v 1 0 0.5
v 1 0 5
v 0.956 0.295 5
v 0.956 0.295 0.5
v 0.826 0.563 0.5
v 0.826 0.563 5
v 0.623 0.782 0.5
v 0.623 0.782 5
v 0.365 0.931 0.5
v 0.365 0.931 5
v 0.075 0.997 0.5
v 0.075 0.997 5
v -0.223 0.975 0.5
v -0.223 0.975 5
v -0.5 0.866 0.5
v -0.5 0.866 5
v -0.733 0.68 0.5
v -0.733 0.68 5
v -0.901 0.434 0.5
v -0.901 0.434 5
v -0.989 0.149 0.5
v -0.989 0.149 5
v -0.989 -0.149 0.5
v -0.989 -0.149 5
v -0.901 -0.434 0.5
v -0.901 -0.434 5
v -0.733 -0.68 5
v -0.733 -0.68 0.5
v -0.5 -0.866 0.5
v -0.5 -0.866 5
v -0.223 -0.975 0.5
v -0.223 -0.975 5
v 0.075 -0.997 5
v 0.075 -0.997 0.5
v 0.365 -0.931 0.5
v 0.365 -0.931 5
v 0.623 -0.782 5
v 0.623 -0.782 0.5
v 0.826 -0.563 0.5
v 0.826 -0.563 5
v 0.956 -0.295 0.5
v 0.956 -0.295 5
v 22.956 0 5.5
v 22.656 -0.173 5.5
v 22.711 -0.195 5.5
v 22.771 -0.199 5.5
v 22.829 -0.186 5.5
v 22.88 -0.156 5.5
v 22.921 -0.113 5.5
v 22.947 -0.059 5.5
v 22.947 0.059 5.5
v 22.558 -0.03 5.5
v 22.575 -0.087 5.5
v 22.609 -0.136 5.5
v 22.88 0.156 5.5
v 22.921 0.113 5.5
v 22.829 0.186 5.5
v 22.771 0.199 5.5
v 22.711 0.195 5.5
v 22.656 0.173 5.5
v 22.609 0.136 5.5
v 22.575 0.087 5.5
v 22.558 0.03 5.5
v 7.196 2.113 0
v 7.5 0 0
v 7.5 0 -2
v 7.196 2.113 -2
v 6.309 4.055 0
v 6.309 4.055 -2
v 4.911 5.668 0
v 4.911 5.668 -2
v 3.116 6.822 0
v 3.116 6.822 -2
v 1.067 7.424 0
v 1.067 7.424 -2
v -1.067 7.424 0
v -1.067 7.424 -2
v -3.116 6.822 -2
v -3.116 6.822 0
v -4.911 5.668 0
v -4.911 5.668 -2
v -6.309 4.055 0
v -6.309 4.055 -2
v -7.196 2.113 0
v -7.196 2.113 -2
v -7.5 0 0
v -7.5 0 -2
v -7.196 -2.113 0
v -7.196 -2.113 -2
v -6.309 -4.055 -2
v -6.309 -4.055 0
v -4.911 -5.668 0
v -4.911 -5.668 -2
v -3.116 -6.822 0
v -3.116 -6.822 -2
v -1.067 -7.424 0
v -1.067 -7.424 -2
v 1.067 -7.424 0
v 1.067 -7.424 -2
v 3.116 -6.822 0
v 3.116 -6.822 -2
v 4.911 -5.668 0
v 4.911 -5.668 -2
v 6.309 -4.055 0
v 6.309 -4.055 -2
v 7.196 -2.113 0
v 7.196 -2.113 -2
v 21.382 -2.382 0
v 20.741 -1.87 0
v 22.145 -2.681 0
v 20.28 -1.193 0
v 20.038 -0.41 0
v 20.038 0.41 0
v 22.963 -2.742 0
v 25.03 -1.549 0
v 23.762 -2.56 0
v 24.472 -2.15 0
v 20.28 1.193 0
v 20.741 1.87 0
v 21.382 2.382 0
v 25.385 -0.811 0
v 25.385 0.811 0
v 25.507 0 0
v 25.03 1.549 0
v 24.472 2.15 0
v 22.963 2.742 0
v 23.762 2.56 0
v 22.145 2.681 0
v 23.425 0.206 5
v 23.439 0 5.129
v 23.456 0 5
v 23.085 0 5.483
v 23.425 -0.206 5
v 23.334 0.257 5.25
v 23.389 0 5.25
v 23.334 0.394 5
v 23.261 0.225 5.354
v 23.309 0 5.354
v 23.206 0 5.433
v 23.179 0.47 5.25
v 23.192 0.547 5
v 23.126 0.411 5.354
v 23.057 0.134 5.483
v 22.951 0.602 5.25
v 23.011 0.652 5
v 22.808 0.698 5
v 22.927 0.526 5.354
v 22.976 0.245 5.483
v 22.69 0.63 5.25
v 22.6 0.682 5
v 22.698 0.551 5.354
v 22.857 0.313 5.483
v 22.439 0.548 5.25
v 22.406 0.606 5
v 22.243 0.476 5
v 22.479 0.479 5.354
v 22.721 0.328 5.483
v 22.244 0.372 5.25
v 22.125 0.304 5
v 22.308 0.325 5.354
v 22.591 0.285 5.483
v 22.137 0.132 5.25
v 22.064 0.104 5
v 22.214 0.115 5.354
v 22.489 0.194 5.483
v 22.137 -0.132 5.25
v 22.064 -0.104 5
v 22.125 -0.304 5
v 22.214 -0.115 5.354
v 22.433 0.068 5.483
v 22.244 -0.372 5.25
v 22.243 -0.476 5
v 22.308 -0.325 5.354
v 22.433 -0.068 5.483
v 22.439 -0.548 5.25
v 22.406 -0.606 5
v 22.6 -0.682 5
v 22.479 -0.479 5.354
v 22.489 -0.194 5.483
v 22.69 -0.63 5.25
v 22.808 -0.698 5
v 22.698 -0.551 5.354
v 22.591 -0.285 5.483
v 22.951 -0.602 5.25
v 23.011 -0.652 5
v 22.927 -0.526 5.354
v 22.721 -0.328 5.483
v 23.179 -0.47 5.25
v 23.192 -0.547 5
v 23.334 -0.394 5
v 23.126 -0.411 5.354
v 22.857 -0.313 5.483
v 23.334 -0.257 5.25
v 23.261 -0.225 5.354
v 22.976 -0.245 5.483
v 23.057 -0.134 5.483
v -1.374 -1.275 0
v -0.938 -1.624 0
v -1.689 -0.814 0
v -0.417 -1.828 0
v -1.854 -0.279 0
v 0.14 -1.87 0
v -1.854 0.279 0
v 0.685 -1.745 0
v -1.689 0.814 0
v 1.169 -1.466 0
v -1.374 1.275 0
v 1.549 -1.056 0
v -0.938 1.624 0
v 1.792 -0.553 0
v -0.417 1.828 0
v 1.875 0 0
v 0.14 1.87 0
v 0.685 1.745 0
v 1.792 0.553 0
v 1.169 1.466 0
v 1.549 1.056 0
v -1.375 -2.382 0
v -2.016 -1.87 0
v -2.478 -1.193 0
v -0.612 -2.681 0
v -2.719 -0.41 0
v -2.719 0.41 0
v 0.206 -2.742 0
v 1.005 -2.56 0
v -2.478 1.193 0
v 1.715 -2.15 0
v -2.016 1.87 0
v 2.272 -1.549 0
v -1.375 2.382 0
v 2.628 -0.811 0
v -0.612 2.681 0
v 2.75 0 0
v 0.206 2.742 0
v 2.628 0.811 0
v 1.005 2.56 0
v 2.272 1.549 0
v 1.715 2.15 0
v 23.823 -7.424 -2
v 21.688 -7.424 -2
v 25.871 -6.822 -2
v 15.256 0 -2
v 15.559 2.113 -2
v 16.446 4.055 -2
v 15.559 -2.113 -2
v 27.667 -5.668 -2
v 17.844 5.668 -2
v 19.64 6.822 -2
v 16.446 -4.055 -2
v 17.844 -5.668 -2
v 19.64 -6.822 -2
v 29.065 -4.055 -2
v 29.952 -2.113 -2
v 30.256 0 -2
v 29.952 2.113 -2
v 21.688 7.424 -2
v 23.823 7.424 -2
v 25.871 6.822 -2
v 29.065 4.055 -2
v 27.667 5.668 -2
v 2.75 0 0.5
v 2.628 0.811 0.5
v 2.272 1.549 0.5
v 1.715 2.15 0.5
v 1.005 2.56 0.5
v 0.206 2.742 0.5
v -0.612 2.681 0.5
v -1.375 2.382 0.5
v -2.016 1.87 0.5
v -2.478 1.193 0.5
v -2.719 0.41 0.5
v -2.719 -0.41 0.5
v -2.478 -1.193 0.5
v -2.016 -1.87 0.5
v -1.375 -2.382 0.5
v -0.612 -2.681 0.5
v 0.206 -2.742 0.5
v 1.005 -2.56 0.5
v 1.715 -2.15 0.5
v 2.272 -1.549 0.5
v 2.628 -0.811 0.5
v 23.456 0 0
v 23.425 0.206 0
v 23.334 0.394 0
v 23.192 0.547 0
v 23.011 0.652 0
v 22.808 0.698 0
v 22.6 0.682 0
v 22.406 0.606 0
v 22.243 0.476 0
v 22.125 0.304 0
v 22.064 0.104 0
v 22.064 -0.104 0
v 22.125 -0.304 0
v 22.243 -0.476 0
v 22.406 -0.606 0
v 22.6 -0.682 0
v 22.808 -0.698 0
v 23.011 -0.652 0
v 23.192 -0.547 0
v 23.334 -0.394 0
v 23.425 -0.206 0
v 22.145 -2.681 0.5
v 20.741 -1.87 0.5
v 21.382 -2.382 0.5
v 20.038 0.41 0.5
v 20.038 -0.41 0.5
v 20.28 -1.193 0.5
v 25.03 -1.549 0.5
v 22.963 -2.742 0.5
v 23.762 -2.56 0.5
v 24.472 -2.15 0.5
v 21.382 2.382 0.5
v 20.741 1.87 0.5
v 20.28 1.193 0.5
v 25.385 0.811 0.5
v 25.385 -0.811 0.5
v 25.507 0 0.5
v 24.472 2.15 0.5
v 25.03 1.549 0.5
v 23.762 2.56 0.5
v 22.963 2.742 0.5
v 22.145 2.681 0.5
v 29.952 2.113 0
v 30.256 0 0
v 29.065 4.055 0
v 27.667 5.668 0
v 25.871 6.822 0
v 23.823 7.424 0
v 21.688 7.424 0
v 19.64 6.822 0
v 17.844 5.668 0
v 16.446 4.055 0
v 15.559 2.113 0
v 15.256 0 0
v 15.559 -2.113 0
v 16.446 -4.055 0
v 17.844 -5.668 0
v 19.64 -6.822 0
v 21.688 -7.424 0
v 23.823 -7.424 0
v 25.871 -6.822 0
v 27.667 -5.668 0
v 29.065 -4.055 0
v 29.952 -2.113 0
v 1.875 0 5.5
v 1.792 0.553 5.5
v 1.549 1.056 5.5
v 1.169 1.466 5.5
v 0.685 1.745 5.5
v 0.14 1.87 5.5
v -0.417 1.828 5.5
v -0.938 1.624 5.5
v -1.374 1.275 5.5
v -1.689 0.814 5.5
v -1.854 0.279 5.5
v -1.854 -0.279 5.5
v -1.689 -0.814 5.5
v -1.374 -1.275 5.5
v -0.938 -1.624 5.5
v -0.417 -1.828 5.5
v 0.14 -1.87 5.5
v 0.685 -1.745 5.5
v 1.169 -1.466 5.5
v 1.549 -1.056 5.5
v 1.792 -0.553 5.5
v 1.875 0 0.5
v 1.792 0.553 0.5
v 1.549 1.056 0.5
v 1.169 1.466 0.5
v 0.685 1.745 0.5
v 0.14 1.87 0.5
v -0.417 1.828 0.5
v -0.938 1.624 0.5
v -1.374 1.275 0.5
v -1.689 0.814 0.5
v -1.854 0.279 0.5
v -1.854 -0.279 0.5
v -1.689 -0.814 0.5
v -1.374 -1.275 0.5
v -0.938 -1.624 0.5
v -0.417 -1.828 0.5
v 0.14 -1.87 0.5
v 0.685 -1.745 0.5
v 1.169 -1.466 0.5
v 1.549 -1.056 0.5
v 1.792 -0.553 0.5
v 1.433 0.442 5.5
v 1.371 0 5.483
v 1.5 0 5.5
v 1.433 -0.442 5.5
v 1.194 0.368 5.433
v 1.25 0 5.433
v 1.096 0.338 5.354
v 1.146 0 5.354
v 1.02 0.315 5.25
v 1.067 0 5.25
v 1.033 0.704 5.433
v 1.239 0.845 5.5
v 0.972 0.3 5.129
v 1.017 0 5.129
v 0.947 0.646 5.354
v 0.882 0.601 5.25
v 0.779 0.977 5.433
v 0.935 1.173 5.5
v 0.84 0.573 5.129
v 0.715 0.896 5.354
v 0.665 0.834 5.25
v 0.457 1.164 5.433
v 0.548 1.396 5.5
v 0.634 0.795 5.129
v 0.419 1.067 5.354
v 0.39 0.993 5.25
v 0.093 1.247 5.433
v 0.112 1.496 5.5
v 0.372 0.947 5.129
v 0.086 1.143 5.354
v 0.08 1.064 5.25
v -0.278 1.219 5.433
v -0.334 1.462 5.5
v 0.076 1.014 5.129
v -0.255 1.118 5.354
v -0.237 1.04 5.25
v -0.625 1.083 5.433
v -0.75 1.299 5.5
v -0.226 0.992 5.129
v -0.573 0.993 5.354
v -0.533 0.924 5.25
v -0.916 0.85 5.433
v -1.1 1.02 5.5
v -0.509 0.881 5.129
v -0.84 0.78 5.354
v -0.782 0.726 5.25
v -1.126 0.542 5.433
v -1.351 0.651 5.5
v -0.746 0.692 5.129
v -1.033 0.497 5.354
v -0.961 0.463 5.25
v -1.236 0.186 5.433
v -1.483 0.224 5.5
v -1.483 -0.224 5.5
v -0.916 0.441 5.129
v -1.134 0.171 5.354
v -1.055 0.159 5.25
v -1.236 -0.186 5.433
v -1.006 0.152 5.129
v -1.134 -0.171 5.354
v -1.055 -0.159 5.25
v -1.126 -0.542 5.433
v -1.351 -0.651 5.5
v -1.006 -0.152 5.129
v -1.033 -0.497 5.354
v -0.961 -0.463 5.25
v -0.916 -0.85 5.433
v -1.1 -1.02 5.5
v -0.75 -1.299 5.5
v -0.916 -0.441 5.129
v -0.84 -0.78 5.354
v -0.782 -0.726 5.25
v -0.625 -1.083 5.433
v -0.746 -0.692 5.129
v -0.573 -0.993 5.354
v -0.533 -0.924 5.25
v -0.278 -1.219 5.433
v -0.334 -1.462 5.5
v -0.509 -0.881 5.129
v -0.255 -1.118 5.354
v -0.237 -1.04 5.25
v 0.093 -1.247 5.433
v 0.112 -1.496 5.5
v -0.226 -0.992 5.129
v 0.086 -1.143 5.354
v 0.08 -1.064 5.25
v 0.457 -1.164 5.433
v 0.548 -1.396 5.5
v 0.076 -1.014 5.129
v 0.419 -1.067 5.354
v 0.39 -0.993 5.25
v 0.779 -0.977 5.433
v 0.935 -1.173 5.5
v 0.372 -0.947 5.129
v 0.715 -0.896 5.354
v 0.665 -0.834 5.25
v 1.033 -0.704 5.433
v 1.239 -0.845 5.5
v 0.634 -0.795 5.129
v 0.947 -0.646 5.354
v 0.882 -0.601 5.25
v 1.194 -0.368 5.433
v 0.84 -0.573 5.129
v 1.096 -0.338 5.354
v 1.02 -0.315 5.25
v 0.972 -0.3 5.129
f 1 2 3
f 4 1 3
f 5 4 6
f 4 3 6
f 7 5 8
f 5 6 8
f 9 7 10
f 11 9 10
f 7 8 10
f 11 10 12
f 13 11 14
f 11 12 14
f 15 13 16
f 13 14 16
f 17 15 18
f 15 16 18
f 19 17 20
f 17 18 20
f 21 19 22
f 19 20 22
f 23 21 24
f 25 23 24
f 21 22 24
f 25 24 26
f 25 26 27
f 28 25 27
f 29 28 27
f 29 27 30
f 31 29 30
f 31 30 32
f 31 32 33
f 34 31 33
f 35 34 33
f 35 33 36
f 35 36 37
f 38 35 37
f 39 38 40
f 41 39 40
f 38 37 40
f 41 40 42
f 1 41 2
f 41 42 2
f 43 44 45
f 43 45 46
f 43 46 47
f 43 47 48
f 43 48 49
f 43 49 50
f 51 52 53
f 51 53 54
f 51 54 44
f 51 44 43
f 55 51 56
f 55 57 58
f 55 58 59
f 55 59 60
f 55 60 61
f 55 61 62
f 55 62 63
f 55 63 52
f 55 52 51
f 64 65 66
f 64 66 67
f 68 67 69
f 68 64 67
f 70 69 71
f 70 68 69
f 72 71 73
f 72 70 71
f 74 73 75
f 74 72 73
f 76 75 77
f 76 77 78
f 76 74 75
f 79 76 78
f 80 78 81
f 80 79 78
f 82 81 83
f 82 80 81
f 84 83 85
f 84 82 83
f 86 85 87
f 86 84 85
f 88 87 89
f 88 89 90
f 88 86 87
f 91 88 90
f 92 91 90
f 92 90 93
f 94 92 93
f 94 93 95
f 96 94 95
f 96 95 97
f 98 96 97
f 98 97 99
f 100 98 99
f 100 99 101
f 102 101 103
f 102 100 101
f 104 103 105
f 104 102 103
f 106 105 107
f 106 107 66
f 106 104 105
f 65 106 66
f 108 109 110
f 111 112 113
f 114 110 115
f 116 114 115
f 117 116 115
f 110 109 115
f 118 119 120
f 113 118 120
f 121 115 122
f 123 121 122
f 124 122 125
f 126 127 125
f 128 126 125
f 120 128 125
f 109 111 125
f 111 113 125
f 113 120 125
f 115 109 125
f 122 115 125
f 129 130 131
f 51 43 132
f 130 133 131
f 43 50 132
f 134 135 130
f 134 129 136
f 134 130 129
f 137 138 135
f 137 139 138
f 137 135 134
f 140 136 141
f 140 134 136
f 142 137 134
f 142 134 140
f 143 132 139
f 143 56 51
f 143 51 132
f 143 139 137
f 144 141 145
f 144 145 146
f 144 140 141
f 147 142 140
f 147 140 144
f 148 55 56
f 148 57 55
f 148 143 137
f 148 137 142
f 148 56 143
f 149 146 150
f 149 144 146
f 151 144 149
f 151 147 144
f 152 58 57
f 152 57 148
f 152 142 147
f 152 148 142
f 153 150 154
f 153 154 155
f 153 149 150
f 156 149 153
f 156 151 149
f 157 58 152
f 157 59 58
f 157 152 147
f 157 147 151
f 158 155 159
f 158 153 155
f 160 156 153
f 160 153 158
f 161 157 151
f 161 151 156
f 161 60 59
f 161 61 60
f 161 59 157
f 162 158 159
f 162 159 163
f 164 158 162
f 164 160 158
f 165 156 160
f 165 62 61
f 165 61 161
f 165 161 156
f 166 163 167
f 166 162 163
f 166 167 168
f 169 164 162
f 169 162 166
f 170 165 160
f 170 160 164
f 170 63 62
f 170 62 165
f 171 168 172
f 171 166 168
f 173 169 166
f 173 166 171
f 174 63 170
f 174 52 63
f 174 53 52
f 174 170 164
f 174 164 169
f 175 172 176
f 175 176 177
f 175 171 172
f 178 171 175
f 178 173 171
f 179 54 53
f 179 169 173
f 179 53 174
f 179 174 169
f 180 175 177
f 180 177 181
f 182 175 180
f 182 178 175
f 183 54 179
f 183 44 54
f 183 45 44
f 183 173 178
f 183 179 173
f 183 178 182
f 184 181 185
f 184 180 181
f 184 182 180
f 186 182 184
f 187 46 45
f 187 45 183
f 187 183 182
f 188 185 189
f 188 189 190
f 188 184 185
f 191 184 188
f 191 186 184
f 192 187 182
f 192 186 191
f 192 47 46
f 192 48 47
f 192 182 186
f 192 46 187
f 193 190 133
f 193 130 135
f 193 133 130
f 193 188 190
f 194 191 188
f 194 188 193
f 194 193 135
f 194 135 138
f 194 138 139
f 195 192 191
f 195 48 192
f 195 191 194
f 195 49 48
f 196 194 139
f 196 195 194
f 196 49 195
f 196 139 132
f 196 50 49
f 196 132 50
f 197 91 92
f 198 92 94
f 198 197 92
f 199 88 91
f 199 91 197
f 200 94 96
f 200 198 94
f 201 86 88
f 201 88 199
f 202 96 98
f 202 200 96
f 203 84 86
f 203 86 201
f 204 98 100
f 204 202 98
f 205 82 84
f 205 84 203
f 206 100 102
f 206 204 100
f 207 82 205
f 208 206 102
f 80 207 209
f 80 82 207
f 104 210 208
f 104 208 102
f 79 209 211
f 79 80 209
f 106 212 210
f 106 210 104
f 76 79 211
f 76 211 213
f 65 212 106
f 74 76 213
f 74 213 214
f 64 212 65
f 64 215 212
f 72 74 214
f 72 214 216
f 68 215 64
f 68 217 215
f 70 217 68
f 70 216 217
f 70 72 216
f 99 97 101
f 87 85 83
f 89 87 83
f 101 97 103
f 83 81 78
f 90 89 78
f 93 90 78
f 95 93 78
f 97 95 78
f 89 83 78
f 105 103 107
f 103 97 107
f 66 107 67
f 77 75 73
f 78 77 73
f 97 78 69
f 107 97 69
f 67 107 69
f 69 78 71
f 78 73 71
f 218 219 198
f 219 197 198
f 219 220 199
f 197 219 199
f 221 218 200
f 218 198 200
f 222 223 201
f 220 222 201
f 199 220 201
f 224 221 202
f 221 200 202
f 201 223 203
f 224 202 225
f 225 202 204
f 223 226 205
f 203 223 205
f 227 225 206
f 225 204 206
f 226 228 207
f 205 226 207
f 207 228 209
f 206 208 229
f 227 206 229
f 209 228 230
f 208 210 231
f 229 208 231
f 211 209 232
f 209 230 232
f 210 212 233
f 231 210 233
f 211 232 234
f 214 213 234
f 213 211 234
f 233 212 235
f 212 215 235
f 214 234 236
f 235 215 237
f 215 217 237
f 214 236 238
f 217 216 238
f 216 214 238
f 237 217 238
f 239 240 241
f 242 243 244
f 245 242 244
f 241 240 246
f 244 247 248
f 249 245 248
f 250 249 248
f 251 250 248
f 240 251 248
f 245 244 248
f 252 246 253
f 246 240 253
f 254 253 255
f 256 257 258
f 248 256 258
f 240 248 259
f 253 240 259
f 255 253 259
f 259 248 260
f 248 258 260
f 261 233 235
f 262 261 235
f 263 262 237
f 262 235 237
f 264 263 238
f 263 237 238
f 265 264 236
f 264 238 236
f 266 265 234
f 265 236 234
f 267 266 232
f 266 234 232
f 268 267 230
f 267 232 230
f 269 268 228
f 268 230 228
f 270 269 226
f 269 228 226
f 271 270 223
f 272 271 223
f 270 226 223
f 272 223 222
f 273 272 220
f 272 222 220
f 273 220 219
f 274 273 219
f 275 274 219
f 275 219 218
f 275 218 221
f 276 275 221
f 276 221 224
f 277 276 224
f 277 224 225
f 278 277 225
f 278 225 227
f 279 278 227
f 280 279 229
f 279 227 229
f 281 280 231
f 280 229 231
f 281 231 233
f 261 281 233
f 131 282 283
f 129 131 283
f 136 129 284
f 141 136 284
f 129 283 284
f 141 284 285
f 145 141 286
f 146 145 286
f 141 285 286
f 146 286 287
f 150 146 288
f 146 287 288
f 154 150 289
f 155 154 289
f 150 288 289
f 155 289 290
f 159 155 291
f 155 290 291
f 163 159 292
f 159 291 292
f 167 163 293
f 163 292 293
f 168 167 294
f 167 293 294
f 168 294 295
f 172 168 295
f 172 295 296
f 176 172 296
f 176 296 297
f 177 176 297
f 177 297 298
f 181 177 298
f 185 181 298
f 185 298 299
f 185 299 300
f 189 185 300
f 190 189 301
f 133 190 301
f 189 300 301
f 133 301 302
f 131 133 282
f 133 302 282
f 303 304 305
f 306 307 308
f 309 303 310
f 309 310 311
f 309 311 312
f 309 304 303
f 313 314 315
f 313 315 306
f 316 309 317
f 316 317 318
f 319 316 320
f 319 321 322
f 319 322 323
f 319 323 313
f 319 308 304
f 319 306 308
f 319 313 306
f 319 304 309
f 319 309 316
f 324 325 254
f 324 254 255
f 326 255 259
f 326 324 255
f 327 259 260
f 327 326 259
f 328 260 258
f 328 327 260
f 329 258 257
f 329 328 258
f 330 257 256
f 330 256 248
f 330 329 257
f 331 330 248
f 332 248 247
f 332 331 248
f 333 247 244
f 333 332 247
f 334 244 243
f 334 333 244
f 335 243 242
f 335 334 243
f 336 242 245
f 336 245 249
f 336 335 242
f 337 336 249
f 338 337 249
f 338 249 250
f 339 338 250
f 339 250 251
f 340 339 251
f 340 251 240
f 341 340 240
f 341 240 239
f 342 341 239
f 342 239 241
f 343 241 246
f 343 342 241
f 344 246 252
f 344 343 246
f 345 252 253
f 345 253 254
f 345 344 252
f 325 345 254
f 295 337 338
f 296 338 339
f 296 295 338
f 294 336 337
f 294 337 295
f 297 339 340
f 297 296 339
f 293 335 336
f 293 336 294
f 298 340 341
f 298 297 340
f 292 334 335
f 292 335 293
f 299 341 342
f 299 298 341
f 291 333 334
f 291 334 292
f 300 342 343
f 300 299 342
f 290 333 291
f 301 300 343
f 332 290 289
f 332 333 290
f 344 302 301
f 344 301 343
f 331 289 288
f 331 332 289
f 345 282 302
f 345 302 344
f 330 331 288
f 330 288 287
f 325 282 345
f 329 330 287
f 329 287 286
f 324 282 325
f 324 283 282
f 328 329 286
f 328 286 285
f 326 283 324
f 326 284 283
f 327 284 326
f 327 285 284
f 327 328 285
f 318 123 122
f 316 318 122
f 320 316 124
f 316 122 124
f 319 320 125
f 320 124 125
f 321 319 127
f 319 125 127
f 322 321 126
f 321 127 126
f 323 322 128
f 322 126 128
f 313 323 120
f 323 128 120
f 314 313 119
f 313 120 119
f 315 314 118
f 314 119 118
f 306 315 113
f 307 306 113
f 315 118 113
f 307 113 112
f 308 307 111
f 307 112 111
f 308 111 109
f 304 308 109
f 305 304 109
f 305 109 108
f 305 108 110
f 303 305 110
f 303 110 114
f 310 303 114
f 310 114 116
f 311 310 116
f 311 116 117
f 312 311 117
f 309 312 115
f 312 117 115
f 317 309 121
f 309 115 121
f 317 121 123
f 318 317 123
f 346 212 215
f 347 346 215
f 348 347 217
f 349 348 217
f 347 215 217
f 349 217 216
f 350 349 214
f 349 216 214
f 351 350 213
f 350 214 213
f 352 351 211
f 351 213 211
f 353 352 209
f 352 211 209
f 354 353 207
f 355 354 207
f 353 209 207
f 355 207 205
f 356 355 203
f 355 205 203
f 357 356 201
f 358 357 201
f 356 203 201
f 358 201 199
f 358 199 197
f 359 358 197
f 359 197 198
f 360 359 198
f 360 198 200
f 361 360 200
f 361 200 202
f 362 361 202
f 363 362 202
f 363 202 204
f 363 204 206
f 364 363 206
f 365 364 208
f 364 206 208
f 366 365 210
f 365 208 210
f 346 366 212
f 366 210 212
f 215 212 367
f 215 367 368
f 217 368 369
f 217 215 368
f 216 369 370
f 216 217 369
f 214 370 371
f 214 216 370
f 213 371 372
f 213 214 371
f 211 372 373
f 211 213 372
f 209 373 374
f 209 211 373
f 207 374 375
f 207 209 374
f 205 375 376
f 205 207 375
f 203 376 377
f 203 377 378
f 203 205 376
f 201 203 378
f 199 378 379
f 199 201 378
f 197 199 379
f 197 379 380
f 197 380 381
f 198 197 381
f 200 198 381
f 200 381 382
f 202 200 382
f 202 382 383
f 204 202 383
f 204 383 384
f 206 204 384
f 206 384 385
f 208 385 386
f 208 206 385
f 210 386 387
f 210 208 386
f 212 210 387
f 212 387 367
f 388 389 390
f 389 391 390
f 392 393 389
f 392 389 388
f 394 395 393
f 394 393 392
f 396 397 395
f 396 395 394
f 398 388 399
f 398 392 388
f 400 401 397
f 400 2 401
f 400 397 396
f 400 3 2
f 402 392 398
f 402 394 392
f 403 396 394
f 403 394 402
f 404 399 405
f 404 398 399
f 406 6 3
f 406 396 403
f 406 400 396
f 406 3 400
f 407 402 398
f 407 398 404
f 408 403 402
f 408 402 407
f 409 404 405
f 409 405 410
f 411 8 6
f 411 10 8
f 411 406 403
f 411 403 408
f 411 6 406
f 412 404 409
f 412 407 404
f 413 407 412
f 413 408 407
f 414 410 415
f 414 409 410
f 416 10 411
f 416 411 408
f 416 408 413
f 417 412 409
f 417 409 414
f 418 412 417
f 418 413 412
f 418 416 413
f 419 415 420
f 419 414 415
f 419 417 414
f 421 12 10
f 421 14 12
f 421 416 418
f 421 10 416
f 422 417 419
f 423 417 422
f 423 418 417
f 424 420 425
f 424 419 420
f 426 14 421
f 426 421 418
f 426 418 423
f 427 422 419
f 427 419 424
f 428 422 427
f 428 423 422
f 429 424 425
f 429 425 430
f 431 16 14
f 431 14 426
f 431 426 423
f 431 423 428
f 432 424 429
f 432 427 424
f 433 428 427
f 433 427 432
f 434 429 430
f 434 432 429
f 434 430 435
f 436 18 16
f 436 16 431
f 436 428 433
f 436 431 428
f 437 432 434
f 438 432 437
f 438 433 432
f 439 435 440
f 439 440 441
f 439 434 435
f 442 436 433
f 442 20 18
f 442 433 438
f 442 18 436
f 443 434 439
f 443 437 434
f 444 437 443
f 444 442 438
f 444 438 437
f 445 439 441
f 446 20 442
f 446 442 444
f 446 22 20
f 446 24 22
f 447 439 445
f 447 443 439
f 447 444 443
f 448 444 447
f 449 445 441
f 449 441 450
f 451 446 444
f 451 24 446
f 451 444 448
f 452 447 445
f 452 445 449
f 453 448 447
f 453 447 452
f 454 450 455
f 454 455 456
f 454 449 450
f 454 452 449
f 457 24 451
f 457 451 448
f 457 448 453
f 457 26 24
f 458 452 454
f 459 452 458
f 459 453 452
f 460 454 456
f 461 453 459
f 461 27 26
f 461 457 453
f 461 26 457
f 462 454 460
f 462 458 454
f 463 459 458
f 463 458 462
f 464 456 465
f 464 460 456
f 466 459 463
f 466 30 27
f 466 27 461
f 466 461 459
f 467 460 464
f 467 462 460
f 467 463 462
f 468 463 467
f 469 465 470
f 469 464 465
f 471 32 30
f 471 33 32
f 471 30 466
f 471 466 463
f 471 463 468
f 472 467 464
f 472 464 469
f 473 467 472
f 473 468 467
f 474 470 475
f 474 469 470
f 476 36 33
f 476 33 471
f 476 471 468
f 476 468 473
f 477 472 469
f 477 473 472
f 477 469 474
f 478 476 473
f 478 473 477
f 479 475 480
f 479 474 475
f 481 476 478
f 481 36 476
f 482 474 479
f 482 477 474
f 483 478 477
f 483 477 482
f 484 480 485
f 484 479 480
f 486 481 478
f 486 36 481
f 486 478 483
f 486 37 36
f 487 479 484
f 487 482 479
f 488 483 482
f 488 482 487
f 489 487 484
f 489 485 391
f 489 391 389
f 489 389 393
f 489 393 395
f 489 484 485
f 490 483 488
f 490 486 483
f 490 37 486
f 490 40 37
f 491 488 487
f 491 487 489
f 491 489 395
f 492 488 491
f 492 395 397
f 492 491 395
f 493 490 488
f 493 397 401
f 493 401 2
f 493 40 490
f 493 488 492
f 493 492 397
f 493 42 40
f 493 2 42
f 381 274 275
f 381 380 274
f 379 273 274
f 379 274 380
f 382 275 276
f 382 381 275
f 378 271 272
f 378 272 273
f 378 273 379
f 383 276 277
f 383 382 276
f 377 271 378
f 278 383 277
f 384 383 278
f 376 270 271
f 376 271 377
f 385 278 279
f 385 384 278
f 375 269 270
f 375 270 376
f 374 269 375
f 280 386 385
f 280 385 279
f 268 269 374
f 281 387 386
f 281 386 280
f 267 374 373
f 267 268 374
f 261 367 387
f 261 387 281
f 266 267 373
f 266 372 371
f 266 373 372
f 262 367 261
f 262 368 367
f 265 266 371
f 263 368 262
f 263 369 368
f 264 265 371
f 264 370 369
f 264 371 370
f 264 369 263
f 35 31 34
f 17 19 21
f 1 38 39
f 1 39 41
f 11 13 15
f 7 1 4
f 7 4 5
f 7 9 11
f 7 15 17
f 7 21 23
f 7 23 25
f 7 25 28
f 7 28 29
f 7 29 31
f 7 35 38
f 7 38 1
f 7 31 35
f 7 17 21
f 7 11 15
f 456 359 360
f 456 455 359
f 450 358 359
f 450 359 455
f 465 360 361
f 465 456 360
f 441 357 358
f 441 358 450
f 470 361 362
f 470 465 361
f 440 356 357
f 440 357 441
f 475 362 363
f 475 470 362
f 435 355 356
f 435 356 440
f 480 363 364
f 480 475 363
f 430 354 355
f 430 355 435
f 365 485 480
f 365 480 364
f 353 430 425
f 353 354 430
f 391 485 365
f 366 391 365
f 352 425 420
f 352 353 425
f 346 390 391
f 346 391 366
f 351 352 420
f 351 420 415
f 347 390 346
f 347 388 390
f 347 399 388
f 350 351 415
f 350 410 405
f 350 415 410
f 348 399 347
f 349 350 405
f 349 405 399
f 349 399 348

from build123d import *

# Parameters (mm, degrees)
F0_R      = 7.5
F1_DEPTH  = 2
F2_R      = 1.875
F3_DEPTH  = 5.5
F4_R      = 1
F5_DEPTH  = 5
F6_R      = 0.7
F7_DEPTH  = 5.5
F8_R      = 0.5
F8_2_R    = 0.5
F15_R     = 2.75
F15_R_2   = 1.875
F16_DEPTH = 0.5


with BuildPart() as f1:
    # F0 (on Top) → F1 (new body)
    with BuildSketch(Plane.XY):
        Circle(F0_R)
    extrude(amount=-F1_DEPTH)

    # F2 (on Top) → F3 (join)
    with BuildSketch(Plane.XY):
        Circle(F2_R)
    extrude(amount=F3_DEPTH)

    # F4 (on face) → F5 (cut)
    with BuildSketch(Plane.XY.offset(5.5)):
        Circle(F4_R)
    extrude(amount=-F5_DEPTH, mode=Mode.SUBTRACT)

    # F8#2
    f8_2_edges = [f1.edges().sort_by_distance(p)[0] for p in [
        (-1, 0, 5.5),
    ]]
    fillet(f8_2_edges, radius=F8_2_R)

    # F11 (on offset) → F12 (revolve, cut)
    with BuildSketch(Plane.XY.offset(-25)):
        with BuildLine():
            Line((0, 23), (0, -23))
            ThreePointArc((0, -23), (23, 0), (0, 23))
        make_face()
    revolve(axis=Axis((0, -3.1805001199, -25), (0, 1, 0)), mode=Mode.SUBTRACT)

    # F13 (on offset) → F14 (revolve, cut)
    with BuildSketch(Plane.XY.offset(-25)):
        with BuildLine():
            Line((22.7556936443, 23), (22.7556936443, -23))
            ThreePointArc((22.7556936443, -23), (45.7556936443, 0), (22.7556936443, 23))
        make_face()
    revolve(axis=Axis((22.7556936443, 0, -25), (0, 1, 0)), mode=Mode.SUBTRACT)


with BuildPart() as f1b:
    # F0 (on Top) → F1, piece 2 (new body)
    with BuildSketch(Plane.XY):
        with Locations((22.7556936443, 0)):
            Circle(F0_R)
    extrude(amount=-F1_DEPTH)

    # F6 (on face) → F7 (join)
    with BuildSketch(Plane.XY):
        with Locations((22.7556936443, 0)):
            Circle(F6_R)
    extrude(amount=F7_DEPTH)

    # F8
    f8_edges = [f1b.edges().sort_by_distance(p)[0] for p in [
        (22.055694, 0, 5.5),
    ]]
    fillet(f8_edges, radius=F8_R)


with BuildPart() as f16:
    # F15 (on face) → F16 (new body)
    with BuildSketch(Plane.XY):
        Circle(F15_R)
        Circle(F15_R_2, mode=Mode.SUBTRACT)
    extrude(amount=F16_DEPTH)


with BuildPart() as f16b:
    # F15 (on face) → F16, piece 2 (new body)
    with BuildSketch(Plane.XY):
        with Locations((22.757390514, 0)):
            Circle(F15_R)
    extrude(amount=F16_DEPTH)


solid = Compound([f1.part, f1b.part, f16.part, f16b.part])
